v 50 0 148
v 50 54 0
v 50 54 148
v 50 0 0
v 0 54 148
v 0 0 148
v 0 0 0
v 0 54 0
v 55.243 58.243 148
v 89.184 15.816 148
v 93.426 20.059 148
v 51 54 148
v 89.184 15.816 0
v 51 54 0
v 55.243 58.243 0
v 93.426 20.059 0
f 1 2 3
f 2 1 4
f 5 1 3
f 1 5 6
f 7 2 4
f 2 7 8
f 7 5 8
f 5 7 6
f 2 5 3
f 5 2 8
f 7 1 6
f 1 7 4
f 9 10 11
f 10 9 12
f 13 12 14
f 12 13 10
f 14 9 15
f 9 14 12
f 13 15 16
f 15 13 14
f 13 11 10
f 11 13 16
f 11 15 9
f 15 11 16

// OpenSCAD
module fridge(width = 54, depth = 57, height = 148, door_angle = 45)
{
    door_thickness = 6;
    door_gap = 1;
    body_depth = depth-door_thickness-door_gap;
    
    translate([0, 0, 0]) 
    color([0.8,0.8,0.8, 1.0])
    cube([depth-door_thickness-door_gap, width, height], center = false);

    translate([depth-door_thickness, width, 0]) 
    rotate([0,0,door_angle])
    translate([0, -width, 0]) 
    color([0.75,0.75,0.75, 1.0])
    cube([door_thickness, width, height], center = false);
}        

fridge();
